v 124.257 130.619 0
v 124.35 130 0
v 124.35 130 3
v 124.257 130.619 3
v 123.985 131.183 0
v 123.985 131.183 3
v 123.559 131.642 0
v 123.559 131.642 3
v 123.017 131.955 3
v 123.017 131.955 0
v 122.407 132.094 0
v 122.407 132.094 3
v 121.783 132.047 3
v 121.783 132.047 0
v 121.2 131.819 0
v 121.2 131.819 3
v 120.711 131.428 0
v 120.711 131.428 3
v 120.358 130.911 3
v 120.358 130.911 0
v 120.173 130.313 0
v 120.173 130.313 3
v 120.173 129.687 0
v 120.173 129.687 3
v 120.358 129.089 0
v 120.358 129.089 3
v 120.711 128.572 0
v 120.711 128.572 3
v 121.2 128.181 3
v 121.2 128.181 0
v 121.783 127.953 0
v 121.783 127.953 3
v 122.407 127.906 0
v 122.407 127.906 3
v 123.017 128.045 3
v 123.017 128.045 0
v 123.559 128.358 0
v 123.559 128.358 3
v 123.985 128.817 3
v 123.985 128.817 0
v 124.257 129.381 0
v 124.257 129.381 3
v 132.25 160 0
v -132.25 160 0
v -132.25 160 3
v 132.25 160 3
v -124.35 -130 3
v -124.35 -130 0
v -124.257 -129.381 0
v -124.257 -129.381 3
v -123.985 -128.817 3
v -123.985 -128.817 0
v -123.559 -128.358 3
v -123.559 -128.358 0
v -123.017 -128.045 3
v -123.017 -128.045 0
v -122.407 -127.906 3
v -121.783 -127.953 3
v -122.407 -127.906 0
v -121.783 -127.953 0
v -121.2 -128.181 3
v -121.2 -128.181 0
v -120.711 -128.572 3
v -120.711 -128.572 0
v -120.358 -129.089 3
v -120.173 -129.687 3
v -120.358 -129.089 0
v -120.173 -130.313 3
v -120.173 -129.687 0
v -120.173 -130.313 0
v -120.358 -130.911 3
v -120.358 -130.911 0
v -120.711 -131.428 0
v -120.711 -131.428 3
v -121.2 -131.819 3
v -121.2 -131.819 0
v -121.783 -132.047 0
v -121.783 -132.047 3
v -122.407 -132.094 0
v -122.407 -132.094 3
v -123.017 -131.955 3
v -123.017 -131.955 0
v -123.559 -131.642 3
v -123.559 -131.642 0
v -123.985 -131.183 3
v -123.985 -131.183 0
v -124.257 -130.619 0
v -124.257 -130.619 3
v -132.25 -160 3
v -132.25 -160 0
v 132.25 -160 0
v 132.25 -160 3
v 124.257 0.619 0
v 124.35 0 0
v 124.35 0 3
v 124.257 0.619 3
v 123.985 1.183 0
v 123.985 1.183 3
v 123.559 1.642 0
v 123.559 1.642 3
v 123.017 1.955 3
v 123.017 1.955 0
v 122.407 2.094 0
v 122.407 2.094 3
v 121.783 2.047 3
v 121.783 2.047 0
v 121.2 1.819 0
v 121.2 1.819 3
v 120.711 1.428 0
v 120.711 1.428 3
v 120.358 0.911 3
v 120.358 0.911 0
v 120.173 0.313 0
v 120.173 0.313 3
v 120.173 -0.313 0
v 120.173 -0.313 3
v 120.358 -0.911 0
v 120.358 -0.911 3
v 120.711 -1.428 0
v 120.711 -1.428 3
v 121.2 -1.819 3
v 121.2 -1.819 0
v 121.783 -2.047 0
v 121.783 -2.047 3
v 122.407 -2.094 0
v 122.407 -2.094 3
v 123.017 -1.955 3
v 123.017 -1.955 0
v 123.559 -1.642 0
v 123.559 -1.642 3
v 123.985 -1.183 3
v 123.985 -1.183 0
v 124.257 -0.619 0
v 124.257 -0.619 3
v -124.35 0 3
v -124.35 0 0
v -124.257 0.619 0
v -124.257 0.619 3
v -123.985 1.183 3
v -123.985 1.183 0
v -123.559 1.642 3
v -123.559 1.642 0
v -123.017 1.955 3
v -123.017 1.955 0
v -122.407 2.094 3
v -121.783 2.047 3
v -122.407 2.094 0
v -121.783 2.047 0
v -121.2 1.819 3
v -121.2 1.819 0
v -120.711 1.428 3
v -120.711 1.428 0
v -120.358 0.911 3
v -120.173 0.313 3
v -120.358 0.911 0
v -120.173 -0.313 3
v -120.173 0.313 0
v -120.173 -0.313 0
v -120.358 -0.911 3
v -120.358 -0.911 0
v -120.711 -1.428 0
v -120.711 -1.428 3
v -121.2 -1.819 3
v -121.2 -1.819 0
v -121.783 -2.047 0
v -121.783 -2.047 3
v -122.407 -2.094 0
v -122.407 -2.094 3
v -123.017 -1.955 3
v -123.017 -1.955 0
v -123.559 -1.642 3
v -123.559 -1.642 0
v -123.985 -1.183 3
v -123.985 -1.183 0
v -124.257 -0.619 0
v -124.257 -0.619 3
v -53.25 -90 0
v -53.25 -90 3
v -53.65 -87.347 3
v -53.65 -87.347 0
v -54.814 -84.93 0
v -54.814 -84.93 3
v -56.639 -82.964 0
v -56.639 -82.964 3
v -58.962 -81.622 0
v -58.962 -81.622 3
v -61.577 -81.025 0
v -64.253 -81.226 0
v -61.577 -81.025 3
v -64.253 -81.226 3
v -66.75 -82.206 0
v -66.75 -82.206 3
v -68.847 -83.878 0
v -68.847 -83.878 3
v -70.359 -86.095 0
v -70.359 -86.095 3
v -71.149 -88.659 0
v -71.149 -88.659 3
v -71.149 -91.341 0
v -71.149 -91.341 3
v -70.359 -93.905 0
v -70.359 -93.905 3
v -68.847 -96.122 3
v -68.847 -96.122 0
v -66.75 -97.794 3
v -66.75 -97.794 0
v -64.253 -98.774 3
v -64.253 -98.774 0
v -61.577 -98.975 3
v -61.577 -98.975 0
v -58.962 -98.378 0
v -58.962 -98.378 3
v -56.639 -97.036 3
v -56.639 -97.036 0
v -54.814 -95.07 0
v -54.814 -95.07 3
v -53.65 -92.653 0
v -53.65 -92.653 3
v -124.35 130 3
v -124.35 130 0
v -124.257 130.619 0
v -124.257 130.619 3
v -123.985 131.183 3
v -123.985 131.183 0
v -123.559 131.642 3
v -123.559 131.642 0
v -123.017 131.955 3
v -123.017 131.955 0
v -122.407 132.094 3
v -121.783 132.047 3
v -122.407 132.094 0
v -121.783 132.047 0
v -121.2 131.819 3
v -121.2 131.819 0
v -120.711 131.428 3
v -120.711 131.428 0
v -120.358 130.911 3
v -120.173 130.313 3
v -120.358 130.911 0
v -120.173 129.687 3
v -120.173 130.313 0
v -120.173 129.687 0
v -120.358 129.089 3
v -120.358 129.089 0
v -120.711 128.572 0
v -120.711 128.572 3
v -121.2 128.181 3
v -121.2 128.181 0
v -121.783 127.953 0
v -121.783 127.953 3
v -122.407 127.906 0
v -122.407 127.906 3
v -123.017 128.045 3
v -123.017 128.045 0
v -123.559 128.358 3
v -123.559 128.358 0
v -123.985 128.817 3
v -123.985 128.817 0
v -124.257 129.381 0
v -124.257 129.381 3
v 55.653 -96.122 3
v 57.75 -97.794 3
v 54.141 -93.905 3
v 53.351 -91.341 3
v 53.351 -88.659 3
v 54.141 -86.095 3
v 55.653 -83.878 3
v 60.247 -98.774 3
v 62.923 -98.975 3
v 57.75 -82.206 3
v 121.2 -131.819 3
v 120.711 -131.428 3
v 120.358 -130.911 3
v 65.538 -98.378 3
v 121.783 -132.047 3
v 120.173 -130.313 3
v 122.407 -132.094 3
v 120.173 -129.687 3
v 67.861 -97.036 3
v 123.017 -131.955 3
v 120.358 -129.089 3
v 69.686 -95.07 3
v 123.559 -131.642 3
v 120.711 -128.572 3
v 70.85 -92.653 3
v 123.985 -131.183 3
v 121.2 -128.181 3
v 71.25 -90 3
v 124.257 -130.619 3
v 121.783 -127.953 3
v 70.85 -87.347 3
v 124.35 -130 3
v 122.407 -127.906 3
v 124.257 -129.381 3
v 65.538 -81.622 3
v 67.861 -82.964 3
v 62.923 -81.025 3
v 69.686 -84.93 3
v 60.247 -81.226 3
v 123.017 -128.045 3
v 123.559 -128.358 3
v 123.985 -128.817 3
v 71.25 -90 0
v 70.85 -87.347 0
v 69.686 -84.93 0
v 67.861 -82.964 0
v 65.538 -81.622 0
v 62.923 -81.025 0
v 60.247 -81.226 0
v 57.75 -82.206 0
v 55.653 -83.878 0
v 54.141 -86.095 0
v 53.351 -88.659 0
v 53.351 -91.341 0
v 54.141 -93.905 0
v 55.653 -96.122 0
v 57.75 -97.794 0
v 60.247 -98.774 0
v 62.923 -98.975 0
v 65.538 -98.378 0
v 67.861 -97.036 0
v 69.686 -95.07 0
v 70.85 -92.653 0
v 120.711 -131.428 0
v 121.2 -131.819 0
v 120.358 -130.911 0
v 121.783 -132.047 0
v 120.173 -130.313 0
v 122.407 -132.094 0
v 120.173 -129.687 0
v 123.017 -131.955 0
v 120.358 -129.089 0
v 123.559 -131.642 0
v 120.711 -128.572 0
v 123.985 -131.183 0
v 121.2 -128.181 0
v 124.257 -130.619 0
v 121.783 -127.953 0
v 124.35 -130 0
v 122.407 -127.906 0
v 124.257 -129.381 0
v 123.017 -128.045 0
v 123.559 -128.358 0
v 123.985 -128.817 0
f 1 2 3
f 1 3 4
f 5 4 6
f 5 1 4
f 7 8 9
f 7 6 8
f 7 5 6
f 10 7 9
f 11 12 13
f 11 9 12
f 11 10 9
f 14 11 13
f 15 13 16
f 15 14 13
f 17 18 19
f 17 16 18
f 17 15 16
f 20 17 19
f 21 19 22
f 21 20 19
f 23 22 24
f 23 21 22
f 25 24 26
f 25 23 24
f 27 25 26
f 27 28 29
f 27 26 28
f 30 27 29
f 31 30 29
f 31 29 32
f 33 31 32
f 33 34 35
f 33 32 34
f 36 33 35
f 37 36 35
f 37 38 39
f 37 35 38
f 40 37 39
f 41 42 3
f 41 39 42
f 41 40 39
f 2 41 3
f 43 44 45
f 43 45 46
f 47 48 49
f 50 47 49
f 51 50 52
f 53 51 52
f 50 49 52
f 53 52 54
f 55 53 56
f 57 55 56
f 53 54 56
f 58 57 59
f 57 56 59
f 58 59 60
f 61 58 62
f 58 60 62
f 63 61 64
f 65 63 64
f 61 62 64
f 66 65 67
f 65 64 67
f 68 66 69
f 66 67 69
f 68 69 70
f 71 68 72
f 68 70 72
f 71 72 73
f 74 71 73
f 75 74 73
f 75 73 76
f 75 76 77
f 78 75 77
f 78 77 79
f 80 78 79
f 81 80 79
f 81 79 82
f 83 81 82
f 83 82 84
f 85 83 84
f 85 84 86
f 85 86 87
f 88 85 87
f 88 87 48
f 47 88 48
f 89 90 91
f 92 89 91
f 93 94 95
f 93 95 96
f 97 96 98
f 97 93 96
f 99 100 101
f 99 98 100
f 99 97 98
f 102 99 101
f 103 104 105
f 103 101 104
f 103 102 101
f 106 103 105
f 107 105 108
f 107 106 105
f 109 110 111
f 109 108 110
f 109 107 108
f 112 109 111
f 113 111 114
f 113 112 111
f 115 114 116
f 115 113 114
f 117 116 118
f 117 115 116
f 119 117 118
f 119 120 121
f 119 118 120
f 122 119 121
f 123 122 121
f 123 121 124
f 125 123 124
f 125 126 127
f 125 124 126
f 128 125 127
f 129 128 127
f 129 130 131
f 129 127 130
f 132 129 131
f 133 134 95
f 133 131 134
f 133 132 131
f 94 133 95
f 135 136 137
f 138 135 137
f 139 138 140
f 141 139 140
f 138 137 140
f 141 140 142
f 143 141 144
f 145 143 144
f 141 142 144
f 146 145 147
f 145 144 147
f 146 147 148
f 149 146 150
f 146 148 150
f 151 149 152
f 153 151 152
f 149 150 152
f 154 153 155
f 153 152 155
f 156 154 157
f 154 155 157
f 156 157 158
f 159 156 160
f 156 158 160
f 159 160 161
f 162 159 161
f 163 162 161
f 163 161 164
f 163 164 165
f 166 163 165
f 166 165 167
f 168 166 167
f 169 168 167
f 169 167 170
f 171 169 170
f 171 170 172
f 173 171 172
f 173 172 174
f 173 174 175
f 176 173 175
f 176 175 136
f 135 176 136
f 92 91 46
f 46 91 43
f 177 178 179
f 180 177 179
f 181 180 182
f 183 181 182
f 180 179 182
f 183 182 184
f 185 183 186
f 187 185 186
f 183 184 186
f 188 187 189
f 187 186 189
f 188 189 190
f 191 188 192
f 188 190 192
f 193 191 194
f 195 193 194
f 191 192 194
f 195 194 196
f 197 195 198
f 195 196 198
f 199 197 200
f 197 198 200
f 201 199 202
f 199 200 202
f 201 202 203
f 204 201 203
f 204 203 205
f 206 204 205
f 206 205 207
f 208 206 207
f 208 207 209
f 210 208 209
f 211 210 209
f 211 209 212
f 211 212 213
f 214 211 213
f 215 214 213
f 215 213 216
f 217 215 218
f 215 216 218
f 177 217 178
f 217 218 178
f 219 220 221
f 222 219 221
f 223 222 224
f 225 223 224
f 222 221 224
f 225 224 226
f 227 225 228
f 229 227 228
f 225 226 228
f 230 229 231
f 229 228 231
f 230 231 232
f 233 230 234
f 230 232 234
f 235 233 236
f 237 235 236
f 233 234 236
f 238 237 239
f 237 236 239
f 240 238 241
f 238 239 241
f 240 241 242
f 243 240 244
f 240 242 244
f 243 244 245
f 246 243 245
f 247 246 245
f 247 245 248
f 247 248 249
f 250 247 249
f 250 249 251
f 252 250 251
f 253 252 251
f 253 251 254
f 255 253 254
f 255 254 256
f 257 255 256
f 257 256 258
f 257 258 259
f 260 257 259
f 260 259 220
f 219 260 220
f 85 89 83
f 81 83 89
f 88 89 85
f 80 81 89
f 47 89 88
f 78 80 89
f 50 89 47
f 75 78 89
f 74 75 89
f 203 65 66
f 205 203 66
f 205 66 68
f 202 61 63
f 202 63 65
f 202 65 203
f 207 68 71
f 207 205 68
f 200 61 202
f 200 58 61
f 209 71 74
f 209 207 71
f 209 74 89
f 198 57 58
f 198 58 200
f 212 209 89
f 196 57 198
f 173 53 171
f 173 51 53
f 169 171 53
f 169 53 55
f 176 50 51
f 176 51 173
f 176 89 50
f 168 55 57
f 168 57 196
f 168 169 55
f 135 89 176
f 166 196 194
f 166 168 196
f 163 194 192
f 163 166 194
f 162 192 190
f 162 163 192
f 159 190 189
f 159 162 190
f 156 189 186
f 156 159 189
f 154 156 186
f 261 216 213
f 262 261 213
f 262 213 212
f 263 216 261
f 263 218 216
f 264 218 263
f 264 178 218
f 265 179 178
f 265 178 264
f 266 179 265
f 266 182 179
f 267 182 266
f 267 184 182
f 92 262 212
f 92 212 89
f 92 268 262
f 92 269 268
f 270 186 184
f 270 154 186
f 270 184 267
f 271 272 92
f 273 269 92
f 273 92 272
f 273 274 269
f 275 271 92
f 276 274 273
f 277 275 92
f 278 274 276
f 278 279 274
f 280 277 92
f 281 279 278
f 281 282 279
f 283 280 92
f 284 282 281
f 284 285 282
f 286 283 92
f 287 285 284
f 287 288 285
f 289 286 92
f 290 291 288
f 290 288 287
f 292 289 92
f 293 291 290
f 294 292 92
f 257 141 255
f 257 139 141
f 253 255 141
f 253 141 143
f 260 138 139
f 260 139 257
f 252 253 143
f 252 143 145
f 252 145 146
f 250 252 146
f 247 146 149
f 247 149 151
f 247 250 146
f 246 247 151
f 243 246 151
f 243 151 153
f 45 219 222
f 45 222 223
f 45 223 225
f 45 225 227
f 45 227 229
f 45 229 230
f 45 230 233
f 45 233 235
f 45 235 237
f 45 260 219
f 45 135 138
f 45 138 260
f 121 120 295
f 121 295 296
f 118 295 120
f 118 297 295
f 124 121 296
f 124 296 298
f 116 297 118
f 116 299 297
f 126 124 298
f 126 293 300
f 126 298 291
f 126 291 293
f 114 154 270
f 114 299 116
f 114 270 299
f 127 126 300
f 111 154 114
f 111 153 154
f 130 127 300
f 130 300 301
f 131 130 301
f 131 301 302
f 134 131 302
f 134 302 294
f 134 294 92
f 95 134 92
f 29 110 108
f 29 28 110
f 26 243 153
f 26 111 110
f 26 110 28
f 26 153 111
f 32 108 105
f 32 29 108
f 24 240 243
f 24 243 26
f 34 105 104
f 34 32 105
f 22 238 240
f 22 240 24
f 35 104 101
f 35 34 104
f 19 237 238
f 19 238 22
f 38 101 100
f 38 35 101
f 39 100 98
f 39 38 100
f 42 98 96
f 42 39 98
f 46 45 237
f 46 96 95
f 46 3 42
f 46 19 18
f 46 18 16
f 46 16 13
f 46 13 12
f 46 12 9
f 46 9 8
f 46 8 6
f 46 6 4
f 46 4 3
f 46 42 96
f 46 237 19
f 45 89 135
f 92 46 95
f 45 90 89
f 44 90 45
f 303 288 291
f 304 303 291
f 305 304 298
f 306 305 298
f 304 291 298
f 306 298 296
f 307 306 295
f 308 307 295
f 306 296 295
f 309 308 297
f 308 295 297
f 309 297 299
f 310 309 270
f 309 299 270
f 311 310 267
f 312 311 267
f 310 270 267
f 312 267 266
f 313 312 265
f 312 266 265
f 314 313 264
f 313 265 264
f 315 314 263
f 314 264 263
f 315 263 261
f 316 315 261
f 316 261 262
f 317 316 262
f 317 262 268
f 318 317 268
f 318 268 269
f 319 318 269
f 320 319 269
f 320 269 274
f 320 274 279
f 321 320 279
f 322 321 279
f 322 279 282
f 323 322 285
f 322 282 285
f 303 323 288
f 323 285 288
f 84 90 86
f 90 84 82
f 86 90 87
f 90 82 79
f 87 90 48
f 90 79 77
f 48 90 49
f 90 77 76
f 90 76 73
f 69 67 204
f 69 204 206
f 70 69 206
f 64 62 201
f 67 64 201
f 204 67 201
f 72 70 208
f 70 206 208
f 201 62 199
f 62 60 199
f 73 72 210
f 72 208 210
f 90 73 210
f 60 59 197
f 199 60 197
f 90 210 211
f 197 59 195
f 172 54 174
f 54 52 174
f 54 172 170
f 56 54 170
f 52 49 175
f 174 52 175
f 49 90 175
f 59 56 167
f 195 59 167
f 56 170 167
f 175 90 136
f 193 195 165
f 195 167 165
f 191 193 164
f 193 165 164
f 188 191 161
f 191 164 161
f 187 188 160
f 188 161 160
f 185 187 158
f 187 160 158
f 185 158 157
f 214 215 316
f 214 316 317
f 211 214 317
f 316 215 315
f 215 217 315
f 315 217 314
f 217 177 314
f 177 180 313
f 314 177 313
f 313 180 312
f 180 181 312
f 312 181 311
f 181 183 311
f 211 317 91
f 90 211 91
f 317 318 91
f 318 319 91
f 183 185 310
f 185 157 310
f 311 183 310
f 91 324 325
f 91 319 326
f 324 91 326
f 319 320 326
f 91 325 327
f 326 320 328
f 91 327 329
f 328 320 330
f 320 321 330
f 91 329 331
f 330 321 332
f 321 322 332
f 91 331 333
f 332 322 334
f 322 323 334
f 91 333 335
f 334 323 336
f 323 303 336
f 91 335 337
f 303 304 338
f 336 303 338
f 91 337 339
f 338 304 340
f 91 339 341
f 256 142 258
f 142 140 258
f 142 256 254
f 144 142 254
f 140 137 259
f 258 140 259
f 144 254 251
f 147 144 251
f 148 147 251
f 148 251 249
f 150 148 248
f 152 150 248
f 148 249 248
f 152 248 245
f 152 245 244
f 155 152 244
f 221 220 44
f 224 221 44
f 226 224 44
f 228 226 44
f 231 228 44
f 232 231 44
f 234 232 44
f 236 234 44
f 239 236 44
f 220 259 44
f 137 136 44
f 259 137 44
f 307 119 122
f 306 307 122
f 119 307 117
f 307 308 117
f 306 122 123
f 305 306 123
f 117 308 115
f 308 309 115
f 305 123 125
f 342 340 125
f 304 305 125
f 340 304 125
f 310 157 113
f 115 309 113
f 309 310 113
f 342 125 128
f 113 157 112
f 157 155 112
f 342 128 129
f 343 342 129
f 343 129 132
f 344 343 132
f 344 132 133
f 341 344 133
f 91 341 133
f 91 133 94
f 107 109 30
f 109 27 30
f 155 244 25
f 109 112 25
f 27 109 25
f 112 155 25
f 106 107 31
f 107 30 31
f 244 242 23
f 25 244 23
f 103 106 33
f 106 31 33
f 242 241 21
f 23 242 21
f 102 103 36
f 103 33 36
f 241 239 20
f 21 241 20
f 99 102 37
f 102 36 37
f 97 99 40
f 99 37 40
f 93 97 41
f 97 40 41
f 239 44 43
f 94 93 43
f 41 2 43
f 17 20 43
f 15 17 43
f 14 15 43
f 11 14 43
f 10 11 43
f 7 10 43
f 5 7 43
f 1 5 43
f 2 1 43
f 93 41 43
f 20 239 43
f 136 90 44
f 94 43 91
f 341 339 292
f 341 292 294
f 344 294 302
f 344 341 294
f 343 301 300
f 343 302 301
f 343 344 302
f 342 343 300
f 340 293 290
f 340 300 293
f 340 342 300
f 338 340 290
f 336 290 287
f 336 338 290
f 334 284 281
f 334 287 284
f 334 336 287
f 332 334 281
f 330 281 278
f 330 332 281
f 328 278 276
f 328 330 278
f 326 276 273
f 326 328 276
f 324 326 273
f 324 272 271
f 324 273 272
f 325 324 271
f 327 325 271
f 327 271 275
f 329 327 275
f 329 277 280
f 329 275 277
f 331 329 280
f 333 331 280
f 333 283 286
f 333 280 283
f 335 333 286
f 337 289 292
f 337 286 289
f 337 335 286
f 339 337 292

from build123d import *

# Parameters (mm, degrees)
F1_W     = 264.5
F1_H     = 320
F2_DEPTH = 3
F4_D     = 4.2
F4_DEPTH = 4
F4_TIP   = 1.2618073
F5_R     = 9
F6_DEPTH = 3


# Not quite as in the source:
# - a pattern or mirror of a feature is missing from the dataset's text; its kind, count and spacing are read off the source's solid


with BuildPart() as f2:
    # F1 (on Top) → F2 (new body)
    with BuildSketch(Plane.XY):
        Rectangle(F1_W, F1_H)
    extrude(amount=F2_DEPTH)

    # F4
    with Locations(Plane.XY.offset(3)):
        with Locations((-122.25, 130), (-122.25, 0), (-122.25, -130)):
            f4 = Hole(F4_D / 2, depth=F4_DEPTH)
            with Locations((0, 0, -(F4_DEPTH + F4_TIP / 2))):  # 118° drill point
                Cone(0, F4_D / 2, F4_TIP, mode=Mode.SUBTRACT)

    # F4_copies: F4 across plane
    add(f4.mirror(Plane(origin=(0, 0, 0), x_dir=(0, 0, 1), z_dir=(1, 0, 0))), mode=Mode.SUBTRACT)

    # F5 (on face) → F6 (cut, through all)
    with BuildSketch(Plane.XY.offset(3)):
        with Locations((-62.25, -90)):
            Circle(F5_R)
        with Locations((62.25, -90)):
            Circle(F5_R)
    extrude(amount=-F6_DEPTH, mode=Mode.SUBTRACT)


solid = f2.part
